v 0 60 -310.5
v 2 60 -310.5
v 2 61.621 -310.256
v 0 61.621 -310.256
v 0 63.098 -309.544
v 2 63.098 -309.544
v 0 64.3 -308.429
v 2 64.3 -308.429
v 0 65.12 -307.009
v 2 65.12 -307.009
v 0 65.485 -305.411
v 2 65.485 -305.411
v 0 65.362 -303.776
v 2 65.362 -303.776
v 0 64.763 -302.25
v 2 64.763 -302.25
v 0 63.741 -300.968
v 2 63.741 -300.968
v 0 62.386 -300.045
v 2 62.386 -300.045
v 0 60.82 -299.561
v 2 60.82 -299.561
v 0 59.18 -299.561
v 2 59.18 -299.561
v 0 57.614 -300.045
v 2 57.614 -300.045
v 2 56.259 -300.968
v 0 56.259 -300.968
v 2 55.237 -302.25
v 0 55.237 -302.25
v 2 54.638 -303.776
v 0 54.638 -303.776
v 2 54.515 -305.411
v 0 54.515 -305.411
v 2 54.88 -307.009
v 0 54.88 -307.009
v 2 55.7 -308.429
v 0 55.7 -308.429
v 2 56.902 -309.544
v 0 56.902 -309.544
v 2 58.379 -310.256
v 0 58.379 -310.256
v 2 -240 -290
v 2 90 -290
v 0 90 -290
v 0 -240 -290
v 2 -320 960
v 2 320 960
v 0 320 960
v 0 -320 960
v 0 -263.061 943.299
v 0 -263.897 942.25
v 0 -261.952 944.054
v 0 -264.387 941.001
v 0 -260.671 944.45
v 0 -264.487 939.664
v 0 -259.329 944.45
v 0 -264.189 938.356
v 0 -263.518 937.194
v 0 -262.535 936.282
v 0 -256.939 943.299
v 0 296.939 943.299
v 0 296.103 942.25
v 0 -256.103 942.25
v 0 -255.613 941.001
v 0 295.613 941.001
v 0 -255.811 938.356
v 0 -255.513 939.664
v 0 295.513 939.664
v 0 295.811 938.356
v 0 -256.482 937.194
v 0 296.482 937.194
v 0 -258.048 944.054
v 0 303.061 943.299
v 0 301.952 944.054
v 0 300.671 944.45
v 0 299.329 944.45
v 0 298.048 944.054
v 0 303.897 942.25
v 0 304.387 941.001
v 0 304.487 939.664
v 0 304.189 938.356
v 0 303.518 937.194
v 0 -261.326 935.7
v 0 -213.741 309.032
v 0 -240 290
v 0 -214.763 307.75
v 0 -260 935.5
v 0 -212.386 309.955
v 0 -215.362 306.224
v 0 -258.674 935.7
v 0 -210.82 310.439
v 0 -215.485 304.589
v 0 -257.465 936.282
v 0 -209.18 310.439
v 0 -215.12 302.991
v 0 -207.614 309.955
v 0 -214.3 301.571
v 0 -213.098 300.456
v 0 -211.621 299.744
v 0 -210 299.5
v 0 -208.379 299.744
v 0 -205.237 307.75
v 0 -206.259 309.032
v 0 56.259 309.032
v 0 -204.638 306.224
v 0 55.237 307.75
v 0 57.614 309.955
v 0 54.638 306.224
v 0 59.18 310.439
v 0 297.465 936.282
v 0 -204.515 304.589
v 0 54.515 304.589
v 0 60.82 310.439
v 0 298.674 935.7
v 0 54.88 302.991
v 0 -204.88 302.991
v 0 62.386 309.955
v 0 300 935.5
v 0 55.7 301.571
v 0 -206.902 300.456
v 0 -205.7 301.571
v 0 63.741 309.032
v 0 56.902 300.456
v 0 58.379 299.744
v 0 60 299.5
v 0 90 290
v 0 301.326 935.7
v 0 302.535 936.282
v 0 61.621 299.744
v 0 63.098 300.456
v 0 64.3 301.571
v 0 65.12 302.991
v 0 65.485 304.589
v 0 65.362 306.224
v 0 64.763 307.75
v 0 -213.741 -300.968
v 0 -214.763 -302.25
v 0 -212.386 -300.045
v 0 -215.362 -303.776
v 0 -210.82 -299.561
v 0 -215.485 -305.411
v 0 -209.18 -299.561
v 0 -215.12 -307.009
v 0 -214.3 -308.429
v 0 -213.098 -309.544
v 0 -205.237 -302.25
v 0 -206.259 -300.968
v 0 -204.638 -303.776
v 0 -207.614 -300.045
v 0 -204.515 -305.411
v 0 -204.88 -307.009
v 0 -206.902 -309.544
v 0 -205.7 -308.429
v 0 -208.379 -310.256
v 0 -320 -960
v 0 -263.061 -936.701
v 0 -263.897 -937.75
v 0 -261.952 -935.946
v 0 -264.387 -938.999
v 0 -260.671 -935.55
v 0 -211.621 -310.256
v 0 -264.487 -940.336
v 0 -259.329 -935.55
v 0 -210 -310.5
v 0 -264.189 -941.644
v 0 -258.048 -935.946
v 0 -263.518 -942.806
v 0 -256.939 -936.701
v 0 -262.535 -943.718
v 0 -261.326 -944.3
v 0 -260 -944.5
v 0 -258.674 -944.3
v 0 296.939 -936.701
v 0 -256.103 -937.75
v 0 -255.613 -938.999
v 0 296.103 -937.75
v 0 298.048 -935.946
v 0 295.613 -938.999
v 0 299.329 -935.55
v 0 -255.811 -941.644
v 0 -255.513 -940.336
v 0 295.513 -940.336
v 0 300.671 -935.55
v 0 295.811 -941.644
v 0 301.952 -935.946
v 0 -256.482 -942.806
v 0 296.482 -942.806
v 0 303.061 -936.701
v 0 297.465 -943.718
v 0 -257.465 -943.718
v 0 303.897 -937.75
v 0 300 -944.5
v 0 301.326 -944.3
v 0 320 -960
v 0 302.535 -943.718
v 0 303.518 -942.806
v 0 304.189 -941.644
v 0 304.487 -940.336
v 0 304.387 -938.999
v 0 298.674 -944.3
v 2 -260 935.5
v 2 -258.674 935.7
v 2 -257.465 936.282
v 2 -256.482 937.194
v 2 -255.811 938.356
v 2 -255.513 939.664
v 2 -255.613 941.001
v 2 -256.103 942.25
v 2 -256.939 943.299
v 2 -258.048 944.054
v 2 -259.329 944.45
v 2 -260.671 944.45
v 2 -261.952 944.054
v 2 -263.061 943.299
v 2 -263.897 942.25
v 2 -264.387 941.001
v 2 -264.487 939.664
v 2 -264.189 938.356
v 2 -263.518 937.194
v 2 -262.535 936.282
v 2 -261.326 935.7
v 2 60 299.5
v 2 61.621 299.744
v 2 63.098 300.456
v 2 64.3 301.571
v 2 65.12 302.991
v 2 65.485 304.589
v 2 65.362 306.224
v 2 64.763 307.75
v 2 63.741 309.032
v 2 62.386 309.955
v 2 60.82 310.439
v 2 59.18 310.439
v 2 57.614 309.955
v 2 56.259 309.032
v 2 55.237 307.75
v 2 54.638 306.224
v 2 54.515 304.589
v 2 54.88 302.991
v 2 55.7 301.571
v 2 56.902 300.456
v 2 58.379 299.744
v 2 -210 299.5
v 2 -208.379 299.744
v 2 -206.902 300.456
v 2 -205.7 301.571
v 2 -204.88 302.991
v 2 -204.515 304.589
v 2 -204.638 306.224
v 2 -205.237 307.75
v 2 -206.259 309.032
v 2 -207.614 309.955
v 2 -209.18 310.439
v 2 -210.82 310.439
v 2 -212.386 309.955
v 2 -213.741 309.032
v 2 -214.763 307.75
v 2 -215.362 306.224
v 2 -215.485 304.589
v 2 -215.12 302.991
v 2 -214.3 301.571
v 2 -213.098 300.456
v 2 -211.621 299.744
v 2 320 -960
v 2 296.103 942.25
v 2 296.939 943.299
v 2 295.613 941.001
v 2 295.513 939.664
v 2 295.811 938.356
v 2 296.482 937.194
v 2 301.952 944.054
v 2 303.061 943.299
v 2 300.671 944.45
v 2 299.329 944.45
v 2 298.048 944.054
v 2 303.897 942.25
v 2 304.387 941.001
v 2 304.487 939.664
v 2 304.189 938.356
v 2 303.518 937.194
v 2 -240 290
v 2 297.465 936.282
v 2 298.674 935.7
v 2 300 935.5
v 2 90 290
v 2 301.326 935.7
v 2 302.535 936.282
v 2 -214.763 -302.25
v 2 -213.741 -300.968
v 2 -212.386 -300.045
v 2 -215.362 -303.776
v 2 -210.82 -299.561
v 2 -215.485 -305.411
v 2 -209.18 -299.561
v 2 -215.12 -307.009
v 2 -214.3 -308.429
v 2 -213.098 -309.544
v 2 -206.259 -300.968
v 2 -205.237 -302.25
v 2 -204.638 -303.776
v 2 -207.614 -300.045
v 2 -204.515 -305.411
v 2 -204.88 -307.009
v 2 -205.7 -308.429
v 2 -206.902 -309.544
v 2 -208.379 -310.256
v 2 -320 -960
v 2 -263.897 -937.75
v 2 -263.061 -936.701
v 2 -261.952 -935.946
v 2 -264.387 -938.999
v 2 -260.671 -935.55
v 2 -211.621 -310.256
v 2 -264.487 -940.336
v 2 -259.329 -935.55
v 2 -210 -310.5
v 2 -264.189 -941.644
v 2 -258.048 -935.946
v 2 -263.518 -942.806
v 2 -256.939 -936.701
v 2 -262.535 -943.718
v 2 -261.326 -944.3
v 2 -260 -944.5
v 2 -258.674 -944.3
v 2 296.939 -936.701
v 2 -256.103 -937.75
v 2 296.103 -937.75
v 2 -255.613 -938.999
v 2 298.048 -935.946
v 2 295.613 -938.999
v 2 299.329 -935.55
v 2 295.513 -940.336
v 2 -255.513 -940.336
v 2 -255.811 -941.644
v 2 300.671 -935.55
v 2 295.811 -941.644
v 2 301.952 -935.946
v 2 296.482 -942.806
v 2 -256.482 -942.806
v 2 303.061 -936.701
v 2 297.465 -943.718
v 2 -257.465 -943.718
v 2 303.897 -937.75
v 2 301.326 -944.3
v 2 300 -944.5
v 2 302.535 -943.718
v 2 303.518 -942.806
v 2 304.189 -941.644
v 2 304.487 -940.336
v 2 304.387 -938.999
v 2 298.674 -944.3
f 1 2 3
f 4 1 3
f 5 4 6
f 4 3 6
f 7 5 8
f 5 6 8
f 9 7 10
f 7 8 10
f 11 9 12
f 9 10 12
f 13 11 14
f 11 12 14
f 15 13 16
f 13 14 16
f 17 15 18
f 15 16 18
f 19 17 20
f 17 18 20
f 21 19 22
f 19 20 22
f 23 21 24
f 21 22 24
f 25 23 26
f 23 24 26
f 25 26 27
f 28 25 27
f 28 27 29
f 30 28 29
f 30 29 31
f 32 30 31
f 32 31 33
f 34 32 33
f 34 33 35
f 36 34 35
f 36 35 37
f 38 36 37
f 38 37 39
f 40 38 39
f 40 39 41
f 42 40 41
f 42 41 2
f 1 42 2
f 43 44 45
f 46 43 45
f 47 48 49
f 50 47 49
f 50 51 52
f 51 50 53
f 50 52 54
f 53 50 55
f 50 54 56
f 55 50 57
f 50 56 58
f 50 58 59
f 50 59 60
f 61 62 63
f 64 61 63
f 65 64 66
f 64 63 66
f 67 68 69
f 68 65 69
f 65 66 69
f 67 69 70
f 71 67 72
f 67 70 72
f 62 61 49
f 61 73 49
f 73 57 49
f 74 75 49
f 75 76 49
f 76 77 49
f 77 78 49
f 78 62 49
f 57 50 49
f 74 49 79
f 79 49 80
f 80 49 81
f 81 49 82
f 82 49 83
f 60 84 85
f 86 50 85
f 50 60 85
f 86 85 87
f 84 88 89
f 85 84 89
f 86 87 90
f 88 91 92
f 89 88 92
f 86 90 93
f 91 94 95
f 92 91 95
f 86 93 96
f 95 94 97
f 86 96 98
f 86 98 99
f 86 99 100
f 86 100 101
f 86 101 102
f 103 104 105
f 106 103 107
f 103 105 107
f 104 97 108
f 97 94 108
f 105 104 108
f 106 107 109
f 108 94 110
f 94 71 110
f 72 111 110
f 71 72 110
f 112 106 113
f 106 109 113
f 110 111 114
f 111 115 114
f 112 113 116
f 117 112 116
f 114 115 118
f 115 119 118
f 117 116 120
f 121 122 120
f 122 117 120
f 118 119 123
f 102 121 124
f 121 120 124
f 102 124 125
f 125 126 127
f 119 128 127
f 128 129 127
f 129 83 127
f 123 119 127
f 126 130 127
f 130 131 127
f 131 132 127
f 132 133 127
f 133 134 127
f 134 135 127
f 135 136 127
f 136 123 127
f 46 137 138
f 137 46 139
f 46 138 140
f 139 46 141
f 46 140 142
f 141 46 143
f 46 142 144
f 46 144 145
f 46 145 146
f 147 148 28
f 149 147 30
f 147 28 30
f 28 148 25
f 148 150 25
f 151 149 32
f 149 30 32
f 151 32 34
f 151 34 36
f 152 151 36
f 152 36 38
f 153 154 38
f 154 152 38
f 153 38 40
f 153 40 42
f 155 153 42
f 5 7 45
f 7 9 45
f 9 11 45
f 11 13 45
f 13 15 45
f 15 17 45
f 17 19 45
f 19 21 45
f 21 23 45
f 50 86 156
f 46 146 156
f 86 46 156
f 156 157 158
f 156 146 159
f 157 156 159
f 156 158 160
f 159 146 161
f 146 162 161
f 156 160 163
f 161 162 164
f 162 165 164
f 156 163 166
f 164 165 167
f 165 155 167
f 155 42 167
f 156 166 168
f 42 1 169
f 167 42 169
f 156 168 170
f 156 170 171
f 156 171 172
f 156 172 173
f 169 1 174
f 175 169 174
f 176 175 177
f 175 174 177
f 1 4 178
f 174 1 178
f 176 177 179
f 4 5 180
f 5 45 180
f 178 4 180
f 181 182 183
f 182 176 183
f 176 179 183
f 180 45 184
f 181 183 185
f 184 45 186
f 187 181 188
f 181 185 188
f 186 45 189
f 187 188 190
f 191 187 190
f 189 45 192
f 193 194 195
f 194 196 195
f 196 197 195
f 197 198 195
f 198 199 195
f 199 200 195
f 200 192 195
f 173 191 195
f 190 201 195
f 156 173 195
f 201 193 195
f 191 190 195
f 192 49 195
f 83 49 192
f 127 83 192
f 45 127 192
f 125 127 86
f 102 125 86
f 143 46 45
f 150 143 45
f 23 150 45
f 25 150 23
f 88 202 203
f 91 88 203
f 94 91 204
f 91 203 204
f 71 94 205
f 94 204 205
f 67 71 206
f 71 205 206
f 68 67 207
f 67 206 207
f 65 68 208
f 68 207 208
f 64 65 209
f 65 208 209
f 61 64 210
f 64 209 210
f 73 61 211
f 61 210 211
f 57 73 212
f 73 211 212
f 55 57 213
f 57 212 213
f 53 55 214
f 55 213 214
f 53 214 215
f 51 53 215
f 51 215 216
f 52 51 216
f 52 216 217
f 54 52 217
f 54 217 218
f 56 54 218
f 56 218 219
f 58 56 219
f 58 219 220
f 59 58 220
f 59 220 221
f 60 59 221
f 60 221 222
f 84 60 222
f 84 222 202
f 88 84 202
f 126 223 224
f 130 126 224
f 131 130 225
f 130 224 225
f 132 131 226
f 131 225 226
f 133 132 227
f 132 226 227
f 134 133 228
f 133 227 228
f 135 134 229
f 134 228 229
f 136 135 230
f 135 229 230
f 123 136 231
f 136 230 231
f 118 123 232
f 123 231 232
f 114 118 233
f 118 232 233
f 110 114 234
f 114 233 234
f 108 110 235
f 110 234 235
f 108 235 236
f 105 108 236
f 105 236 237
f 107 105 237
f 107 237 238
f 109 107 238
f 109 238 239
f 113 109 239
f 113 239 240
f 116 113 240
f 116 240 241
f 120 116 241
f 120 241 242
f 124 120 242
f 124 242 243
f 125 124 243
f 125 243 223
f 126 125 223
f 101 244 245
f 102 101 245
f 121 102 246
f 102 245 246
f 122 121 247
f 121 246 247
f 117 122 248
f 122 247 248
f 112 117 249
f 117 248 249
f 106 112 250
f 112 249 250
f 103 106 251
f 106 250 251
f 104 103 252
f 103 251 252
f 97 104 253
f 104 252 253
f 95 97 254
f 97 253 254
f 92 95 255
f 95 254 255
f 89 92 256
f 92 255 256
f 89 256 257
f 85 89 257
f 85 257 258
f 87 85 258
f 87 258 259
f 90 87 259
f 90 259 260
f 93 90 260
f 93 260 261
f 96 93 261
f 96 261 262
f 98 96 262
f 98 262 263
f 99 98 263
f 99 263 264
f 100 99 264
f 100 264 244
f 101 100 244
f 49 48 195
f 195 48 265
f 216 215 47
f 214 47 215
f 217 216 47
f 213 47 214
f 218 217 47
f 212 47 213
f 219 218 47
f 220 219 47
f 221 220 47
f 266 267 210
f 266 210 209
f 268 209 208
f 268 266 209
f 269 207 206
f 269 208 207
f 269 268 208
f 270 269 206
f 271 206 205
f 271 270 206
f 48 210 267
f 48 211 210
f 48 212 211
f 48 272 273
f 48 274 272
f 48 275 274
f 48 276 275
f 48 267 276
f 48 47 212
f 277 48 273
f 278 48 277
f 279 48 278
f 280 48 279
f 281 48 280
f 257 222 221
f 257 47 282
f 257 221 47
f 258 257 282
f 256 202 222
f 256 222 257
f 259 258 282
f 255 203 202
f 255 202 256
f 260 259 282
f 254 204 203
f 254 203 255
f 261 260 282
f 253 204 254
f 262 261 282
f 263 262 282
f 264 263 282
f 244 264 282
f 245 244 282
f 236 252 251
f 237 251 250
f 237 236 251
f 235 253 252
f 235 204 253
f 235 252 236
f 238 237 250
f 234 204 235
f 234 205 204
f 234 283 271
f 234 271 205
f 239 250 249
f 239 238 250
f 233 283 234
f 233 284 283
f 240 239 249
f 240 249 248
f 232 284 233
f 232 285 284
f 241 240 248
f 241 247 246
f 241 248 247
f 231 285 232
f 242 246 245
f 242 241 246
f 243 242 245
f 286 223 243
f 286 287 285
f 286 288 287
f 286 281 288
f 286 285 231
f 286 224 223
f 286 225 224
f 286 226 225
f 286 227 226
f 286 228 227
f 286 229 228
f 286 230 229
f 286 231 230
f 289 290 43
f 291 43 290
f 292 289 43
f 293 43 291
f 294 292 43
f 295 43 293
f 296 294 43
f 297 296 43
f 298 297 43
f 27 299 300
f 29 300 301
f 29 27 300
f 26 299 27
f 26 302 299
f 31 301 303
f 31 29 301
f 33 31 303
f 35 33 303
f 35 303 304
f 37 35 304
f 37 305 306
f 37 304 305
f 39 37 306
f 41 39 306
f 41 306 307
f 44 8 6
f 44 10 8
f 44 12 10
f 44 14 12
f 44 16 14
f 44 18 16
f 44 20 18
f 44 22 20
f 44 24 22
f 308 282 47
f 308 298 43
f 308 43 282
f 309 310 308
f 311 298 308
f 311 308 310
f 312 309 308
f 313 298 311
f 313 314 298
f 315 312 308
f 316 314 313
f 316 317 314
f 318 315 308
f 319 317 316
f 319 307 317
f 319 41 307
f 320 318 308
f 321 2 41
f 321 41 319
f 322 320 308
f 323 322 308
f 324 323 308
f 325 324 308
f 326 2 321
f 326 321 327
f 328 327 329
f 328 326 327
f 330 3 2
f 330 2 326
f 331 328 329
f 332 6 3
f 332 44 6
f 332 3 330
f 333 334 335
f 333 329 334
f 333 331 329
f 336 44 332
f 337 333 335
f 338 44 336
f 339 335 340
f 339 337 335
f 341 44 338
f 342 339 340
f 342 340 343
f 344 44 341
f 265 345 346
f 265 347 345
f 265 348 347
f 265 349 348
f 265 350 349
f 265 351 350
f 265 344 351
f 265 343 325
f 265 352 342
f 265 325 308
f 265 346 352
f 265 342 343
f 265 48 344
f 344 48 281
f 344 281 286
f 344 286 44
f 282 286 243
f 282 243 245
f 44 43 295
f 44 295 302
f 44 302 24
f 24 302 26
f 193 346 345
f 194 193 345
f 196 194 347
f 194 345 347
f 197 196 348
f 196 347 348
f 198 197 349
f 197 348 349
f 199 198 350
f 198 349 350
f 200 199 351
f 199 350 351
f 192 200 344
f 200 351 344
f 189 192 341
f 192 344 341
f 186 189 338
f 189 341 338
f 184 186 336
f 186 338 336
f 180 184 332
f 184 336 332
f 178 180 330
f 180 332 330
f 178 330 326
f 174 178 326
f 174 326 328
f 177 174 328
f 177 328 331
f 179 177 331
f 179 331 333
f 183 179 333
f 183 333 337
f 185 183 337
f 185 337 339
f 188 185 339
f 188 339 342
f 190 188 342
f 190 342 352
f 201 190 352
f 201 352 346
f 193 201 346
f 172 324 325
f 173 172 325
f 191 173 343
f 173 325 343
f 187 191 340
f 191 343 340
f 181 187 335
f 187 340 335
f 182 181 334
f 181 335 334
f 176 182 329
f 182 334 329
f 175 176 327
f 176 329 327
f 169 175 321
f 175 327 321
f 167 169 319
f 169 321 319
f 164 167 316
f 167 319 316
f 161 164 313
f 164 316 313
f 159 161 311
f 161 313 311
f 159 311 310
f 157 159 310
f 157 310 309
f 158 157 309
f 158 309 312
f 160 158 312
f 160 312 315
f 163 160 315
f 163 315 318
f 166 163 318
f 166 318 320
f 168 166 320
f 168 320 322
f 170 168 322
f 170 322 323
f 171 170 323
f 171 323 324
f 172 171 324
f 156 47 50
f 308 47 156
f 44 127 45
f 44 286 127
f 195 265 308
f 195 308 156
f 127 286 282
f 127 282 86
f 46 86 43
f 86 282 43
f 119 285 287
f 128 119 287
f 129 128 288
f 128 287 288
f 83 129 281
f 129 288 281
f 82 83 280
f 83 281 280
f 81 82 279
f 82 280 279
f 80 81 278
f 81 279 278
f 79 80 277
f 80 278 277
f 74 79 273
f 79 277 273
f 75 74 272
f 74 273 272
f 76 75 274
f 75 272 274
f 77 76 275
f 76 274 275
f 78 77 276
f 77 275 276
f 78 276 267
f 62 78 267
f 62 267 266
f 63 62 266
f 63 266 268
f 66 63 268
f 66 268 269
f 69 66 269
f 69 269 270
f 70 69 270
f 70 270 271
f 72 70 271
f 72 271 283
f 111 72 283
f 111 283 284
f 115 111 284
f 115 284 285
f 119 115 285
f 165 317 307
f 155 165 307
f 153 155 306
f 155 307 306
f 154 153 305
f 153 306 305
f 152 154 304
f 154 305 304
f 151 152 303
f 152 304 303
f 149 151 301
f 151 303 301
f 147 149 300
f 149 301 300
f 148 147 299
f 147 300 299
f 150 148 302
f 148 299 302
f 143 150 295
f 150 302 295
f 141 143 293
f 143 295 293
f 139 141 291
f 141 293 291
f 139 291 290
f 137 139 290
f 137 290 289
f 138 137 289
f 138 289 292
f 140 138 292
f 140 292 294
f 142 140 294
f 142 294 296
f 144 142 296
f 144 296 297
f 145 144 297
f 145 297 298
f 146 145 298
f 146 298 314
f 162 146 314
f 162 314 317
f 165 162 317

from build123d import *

# Parameters (mm, degrees)
SKETCH1_W   = 1920
SKETCH1_H   = 640
SKETCH1_R   = 4.5
SKETCH1_R_2 = 5.5
SKETCH1_W_2 = 580
SKETCH1_H_2 = 330
THICKEN1_T1 = 2


with BuildPart() as body_1:
    # Sketch1 → Surface-Plane1: a flat surface bounded by the sketch
    with BuildSketch(Plane(origin=(0, 0, 0), x_dir=(0, 0, -1), z_dir=(1, 0, 0)), mode=Mode.PRIVATE) as surface_plane1_1_region:
        Rectangle(SKETCH1_W, SKETCH1_H)
        with Locations((-940, 300)):
            Circle(SKETCH1_R, mode=Mode.SUBTRACT)
        with Locations((940, 300)):
            Circle(SKETCH1_R, mode=Mode.SUBTRACT)
        with Locations((940, -260)):
            Circle(SKETCH1_R, mode=Mode.SUBTRACT)
        with Locations((-940, -260)):
            Circle(SKETCH1_R, mode=Mode.SUBTRACT)
        with Locations((-305, 60)):
            Circle(SKETCH1_R_2, mode=Mode.SUBTRACT)
        with Locations((305, 60)):
            Circle(SKETCH1_R_2, mode=Mode.SUBTRACT)
        with Locations((305, -210)):
            Circle(SKETCH1_R_2, mode=Mode.SUBTRACT)
        with Locations((-305, -210)):
            Circle(SKETCH1_R_2, mode=Mode.SUBTRACT)
        with Locations((0, -75)):
            Rectangle(SKETCH1_W_2, SKETCH1_H_2, mode=Mode.SUBTRACT)
    surface_plane1_1 = surface_plane1_1_region.sketch.faces()[0]
    add(Solid.thicken(surface_plane1_1, THICKEN1_T1))


solid = body_1.part
